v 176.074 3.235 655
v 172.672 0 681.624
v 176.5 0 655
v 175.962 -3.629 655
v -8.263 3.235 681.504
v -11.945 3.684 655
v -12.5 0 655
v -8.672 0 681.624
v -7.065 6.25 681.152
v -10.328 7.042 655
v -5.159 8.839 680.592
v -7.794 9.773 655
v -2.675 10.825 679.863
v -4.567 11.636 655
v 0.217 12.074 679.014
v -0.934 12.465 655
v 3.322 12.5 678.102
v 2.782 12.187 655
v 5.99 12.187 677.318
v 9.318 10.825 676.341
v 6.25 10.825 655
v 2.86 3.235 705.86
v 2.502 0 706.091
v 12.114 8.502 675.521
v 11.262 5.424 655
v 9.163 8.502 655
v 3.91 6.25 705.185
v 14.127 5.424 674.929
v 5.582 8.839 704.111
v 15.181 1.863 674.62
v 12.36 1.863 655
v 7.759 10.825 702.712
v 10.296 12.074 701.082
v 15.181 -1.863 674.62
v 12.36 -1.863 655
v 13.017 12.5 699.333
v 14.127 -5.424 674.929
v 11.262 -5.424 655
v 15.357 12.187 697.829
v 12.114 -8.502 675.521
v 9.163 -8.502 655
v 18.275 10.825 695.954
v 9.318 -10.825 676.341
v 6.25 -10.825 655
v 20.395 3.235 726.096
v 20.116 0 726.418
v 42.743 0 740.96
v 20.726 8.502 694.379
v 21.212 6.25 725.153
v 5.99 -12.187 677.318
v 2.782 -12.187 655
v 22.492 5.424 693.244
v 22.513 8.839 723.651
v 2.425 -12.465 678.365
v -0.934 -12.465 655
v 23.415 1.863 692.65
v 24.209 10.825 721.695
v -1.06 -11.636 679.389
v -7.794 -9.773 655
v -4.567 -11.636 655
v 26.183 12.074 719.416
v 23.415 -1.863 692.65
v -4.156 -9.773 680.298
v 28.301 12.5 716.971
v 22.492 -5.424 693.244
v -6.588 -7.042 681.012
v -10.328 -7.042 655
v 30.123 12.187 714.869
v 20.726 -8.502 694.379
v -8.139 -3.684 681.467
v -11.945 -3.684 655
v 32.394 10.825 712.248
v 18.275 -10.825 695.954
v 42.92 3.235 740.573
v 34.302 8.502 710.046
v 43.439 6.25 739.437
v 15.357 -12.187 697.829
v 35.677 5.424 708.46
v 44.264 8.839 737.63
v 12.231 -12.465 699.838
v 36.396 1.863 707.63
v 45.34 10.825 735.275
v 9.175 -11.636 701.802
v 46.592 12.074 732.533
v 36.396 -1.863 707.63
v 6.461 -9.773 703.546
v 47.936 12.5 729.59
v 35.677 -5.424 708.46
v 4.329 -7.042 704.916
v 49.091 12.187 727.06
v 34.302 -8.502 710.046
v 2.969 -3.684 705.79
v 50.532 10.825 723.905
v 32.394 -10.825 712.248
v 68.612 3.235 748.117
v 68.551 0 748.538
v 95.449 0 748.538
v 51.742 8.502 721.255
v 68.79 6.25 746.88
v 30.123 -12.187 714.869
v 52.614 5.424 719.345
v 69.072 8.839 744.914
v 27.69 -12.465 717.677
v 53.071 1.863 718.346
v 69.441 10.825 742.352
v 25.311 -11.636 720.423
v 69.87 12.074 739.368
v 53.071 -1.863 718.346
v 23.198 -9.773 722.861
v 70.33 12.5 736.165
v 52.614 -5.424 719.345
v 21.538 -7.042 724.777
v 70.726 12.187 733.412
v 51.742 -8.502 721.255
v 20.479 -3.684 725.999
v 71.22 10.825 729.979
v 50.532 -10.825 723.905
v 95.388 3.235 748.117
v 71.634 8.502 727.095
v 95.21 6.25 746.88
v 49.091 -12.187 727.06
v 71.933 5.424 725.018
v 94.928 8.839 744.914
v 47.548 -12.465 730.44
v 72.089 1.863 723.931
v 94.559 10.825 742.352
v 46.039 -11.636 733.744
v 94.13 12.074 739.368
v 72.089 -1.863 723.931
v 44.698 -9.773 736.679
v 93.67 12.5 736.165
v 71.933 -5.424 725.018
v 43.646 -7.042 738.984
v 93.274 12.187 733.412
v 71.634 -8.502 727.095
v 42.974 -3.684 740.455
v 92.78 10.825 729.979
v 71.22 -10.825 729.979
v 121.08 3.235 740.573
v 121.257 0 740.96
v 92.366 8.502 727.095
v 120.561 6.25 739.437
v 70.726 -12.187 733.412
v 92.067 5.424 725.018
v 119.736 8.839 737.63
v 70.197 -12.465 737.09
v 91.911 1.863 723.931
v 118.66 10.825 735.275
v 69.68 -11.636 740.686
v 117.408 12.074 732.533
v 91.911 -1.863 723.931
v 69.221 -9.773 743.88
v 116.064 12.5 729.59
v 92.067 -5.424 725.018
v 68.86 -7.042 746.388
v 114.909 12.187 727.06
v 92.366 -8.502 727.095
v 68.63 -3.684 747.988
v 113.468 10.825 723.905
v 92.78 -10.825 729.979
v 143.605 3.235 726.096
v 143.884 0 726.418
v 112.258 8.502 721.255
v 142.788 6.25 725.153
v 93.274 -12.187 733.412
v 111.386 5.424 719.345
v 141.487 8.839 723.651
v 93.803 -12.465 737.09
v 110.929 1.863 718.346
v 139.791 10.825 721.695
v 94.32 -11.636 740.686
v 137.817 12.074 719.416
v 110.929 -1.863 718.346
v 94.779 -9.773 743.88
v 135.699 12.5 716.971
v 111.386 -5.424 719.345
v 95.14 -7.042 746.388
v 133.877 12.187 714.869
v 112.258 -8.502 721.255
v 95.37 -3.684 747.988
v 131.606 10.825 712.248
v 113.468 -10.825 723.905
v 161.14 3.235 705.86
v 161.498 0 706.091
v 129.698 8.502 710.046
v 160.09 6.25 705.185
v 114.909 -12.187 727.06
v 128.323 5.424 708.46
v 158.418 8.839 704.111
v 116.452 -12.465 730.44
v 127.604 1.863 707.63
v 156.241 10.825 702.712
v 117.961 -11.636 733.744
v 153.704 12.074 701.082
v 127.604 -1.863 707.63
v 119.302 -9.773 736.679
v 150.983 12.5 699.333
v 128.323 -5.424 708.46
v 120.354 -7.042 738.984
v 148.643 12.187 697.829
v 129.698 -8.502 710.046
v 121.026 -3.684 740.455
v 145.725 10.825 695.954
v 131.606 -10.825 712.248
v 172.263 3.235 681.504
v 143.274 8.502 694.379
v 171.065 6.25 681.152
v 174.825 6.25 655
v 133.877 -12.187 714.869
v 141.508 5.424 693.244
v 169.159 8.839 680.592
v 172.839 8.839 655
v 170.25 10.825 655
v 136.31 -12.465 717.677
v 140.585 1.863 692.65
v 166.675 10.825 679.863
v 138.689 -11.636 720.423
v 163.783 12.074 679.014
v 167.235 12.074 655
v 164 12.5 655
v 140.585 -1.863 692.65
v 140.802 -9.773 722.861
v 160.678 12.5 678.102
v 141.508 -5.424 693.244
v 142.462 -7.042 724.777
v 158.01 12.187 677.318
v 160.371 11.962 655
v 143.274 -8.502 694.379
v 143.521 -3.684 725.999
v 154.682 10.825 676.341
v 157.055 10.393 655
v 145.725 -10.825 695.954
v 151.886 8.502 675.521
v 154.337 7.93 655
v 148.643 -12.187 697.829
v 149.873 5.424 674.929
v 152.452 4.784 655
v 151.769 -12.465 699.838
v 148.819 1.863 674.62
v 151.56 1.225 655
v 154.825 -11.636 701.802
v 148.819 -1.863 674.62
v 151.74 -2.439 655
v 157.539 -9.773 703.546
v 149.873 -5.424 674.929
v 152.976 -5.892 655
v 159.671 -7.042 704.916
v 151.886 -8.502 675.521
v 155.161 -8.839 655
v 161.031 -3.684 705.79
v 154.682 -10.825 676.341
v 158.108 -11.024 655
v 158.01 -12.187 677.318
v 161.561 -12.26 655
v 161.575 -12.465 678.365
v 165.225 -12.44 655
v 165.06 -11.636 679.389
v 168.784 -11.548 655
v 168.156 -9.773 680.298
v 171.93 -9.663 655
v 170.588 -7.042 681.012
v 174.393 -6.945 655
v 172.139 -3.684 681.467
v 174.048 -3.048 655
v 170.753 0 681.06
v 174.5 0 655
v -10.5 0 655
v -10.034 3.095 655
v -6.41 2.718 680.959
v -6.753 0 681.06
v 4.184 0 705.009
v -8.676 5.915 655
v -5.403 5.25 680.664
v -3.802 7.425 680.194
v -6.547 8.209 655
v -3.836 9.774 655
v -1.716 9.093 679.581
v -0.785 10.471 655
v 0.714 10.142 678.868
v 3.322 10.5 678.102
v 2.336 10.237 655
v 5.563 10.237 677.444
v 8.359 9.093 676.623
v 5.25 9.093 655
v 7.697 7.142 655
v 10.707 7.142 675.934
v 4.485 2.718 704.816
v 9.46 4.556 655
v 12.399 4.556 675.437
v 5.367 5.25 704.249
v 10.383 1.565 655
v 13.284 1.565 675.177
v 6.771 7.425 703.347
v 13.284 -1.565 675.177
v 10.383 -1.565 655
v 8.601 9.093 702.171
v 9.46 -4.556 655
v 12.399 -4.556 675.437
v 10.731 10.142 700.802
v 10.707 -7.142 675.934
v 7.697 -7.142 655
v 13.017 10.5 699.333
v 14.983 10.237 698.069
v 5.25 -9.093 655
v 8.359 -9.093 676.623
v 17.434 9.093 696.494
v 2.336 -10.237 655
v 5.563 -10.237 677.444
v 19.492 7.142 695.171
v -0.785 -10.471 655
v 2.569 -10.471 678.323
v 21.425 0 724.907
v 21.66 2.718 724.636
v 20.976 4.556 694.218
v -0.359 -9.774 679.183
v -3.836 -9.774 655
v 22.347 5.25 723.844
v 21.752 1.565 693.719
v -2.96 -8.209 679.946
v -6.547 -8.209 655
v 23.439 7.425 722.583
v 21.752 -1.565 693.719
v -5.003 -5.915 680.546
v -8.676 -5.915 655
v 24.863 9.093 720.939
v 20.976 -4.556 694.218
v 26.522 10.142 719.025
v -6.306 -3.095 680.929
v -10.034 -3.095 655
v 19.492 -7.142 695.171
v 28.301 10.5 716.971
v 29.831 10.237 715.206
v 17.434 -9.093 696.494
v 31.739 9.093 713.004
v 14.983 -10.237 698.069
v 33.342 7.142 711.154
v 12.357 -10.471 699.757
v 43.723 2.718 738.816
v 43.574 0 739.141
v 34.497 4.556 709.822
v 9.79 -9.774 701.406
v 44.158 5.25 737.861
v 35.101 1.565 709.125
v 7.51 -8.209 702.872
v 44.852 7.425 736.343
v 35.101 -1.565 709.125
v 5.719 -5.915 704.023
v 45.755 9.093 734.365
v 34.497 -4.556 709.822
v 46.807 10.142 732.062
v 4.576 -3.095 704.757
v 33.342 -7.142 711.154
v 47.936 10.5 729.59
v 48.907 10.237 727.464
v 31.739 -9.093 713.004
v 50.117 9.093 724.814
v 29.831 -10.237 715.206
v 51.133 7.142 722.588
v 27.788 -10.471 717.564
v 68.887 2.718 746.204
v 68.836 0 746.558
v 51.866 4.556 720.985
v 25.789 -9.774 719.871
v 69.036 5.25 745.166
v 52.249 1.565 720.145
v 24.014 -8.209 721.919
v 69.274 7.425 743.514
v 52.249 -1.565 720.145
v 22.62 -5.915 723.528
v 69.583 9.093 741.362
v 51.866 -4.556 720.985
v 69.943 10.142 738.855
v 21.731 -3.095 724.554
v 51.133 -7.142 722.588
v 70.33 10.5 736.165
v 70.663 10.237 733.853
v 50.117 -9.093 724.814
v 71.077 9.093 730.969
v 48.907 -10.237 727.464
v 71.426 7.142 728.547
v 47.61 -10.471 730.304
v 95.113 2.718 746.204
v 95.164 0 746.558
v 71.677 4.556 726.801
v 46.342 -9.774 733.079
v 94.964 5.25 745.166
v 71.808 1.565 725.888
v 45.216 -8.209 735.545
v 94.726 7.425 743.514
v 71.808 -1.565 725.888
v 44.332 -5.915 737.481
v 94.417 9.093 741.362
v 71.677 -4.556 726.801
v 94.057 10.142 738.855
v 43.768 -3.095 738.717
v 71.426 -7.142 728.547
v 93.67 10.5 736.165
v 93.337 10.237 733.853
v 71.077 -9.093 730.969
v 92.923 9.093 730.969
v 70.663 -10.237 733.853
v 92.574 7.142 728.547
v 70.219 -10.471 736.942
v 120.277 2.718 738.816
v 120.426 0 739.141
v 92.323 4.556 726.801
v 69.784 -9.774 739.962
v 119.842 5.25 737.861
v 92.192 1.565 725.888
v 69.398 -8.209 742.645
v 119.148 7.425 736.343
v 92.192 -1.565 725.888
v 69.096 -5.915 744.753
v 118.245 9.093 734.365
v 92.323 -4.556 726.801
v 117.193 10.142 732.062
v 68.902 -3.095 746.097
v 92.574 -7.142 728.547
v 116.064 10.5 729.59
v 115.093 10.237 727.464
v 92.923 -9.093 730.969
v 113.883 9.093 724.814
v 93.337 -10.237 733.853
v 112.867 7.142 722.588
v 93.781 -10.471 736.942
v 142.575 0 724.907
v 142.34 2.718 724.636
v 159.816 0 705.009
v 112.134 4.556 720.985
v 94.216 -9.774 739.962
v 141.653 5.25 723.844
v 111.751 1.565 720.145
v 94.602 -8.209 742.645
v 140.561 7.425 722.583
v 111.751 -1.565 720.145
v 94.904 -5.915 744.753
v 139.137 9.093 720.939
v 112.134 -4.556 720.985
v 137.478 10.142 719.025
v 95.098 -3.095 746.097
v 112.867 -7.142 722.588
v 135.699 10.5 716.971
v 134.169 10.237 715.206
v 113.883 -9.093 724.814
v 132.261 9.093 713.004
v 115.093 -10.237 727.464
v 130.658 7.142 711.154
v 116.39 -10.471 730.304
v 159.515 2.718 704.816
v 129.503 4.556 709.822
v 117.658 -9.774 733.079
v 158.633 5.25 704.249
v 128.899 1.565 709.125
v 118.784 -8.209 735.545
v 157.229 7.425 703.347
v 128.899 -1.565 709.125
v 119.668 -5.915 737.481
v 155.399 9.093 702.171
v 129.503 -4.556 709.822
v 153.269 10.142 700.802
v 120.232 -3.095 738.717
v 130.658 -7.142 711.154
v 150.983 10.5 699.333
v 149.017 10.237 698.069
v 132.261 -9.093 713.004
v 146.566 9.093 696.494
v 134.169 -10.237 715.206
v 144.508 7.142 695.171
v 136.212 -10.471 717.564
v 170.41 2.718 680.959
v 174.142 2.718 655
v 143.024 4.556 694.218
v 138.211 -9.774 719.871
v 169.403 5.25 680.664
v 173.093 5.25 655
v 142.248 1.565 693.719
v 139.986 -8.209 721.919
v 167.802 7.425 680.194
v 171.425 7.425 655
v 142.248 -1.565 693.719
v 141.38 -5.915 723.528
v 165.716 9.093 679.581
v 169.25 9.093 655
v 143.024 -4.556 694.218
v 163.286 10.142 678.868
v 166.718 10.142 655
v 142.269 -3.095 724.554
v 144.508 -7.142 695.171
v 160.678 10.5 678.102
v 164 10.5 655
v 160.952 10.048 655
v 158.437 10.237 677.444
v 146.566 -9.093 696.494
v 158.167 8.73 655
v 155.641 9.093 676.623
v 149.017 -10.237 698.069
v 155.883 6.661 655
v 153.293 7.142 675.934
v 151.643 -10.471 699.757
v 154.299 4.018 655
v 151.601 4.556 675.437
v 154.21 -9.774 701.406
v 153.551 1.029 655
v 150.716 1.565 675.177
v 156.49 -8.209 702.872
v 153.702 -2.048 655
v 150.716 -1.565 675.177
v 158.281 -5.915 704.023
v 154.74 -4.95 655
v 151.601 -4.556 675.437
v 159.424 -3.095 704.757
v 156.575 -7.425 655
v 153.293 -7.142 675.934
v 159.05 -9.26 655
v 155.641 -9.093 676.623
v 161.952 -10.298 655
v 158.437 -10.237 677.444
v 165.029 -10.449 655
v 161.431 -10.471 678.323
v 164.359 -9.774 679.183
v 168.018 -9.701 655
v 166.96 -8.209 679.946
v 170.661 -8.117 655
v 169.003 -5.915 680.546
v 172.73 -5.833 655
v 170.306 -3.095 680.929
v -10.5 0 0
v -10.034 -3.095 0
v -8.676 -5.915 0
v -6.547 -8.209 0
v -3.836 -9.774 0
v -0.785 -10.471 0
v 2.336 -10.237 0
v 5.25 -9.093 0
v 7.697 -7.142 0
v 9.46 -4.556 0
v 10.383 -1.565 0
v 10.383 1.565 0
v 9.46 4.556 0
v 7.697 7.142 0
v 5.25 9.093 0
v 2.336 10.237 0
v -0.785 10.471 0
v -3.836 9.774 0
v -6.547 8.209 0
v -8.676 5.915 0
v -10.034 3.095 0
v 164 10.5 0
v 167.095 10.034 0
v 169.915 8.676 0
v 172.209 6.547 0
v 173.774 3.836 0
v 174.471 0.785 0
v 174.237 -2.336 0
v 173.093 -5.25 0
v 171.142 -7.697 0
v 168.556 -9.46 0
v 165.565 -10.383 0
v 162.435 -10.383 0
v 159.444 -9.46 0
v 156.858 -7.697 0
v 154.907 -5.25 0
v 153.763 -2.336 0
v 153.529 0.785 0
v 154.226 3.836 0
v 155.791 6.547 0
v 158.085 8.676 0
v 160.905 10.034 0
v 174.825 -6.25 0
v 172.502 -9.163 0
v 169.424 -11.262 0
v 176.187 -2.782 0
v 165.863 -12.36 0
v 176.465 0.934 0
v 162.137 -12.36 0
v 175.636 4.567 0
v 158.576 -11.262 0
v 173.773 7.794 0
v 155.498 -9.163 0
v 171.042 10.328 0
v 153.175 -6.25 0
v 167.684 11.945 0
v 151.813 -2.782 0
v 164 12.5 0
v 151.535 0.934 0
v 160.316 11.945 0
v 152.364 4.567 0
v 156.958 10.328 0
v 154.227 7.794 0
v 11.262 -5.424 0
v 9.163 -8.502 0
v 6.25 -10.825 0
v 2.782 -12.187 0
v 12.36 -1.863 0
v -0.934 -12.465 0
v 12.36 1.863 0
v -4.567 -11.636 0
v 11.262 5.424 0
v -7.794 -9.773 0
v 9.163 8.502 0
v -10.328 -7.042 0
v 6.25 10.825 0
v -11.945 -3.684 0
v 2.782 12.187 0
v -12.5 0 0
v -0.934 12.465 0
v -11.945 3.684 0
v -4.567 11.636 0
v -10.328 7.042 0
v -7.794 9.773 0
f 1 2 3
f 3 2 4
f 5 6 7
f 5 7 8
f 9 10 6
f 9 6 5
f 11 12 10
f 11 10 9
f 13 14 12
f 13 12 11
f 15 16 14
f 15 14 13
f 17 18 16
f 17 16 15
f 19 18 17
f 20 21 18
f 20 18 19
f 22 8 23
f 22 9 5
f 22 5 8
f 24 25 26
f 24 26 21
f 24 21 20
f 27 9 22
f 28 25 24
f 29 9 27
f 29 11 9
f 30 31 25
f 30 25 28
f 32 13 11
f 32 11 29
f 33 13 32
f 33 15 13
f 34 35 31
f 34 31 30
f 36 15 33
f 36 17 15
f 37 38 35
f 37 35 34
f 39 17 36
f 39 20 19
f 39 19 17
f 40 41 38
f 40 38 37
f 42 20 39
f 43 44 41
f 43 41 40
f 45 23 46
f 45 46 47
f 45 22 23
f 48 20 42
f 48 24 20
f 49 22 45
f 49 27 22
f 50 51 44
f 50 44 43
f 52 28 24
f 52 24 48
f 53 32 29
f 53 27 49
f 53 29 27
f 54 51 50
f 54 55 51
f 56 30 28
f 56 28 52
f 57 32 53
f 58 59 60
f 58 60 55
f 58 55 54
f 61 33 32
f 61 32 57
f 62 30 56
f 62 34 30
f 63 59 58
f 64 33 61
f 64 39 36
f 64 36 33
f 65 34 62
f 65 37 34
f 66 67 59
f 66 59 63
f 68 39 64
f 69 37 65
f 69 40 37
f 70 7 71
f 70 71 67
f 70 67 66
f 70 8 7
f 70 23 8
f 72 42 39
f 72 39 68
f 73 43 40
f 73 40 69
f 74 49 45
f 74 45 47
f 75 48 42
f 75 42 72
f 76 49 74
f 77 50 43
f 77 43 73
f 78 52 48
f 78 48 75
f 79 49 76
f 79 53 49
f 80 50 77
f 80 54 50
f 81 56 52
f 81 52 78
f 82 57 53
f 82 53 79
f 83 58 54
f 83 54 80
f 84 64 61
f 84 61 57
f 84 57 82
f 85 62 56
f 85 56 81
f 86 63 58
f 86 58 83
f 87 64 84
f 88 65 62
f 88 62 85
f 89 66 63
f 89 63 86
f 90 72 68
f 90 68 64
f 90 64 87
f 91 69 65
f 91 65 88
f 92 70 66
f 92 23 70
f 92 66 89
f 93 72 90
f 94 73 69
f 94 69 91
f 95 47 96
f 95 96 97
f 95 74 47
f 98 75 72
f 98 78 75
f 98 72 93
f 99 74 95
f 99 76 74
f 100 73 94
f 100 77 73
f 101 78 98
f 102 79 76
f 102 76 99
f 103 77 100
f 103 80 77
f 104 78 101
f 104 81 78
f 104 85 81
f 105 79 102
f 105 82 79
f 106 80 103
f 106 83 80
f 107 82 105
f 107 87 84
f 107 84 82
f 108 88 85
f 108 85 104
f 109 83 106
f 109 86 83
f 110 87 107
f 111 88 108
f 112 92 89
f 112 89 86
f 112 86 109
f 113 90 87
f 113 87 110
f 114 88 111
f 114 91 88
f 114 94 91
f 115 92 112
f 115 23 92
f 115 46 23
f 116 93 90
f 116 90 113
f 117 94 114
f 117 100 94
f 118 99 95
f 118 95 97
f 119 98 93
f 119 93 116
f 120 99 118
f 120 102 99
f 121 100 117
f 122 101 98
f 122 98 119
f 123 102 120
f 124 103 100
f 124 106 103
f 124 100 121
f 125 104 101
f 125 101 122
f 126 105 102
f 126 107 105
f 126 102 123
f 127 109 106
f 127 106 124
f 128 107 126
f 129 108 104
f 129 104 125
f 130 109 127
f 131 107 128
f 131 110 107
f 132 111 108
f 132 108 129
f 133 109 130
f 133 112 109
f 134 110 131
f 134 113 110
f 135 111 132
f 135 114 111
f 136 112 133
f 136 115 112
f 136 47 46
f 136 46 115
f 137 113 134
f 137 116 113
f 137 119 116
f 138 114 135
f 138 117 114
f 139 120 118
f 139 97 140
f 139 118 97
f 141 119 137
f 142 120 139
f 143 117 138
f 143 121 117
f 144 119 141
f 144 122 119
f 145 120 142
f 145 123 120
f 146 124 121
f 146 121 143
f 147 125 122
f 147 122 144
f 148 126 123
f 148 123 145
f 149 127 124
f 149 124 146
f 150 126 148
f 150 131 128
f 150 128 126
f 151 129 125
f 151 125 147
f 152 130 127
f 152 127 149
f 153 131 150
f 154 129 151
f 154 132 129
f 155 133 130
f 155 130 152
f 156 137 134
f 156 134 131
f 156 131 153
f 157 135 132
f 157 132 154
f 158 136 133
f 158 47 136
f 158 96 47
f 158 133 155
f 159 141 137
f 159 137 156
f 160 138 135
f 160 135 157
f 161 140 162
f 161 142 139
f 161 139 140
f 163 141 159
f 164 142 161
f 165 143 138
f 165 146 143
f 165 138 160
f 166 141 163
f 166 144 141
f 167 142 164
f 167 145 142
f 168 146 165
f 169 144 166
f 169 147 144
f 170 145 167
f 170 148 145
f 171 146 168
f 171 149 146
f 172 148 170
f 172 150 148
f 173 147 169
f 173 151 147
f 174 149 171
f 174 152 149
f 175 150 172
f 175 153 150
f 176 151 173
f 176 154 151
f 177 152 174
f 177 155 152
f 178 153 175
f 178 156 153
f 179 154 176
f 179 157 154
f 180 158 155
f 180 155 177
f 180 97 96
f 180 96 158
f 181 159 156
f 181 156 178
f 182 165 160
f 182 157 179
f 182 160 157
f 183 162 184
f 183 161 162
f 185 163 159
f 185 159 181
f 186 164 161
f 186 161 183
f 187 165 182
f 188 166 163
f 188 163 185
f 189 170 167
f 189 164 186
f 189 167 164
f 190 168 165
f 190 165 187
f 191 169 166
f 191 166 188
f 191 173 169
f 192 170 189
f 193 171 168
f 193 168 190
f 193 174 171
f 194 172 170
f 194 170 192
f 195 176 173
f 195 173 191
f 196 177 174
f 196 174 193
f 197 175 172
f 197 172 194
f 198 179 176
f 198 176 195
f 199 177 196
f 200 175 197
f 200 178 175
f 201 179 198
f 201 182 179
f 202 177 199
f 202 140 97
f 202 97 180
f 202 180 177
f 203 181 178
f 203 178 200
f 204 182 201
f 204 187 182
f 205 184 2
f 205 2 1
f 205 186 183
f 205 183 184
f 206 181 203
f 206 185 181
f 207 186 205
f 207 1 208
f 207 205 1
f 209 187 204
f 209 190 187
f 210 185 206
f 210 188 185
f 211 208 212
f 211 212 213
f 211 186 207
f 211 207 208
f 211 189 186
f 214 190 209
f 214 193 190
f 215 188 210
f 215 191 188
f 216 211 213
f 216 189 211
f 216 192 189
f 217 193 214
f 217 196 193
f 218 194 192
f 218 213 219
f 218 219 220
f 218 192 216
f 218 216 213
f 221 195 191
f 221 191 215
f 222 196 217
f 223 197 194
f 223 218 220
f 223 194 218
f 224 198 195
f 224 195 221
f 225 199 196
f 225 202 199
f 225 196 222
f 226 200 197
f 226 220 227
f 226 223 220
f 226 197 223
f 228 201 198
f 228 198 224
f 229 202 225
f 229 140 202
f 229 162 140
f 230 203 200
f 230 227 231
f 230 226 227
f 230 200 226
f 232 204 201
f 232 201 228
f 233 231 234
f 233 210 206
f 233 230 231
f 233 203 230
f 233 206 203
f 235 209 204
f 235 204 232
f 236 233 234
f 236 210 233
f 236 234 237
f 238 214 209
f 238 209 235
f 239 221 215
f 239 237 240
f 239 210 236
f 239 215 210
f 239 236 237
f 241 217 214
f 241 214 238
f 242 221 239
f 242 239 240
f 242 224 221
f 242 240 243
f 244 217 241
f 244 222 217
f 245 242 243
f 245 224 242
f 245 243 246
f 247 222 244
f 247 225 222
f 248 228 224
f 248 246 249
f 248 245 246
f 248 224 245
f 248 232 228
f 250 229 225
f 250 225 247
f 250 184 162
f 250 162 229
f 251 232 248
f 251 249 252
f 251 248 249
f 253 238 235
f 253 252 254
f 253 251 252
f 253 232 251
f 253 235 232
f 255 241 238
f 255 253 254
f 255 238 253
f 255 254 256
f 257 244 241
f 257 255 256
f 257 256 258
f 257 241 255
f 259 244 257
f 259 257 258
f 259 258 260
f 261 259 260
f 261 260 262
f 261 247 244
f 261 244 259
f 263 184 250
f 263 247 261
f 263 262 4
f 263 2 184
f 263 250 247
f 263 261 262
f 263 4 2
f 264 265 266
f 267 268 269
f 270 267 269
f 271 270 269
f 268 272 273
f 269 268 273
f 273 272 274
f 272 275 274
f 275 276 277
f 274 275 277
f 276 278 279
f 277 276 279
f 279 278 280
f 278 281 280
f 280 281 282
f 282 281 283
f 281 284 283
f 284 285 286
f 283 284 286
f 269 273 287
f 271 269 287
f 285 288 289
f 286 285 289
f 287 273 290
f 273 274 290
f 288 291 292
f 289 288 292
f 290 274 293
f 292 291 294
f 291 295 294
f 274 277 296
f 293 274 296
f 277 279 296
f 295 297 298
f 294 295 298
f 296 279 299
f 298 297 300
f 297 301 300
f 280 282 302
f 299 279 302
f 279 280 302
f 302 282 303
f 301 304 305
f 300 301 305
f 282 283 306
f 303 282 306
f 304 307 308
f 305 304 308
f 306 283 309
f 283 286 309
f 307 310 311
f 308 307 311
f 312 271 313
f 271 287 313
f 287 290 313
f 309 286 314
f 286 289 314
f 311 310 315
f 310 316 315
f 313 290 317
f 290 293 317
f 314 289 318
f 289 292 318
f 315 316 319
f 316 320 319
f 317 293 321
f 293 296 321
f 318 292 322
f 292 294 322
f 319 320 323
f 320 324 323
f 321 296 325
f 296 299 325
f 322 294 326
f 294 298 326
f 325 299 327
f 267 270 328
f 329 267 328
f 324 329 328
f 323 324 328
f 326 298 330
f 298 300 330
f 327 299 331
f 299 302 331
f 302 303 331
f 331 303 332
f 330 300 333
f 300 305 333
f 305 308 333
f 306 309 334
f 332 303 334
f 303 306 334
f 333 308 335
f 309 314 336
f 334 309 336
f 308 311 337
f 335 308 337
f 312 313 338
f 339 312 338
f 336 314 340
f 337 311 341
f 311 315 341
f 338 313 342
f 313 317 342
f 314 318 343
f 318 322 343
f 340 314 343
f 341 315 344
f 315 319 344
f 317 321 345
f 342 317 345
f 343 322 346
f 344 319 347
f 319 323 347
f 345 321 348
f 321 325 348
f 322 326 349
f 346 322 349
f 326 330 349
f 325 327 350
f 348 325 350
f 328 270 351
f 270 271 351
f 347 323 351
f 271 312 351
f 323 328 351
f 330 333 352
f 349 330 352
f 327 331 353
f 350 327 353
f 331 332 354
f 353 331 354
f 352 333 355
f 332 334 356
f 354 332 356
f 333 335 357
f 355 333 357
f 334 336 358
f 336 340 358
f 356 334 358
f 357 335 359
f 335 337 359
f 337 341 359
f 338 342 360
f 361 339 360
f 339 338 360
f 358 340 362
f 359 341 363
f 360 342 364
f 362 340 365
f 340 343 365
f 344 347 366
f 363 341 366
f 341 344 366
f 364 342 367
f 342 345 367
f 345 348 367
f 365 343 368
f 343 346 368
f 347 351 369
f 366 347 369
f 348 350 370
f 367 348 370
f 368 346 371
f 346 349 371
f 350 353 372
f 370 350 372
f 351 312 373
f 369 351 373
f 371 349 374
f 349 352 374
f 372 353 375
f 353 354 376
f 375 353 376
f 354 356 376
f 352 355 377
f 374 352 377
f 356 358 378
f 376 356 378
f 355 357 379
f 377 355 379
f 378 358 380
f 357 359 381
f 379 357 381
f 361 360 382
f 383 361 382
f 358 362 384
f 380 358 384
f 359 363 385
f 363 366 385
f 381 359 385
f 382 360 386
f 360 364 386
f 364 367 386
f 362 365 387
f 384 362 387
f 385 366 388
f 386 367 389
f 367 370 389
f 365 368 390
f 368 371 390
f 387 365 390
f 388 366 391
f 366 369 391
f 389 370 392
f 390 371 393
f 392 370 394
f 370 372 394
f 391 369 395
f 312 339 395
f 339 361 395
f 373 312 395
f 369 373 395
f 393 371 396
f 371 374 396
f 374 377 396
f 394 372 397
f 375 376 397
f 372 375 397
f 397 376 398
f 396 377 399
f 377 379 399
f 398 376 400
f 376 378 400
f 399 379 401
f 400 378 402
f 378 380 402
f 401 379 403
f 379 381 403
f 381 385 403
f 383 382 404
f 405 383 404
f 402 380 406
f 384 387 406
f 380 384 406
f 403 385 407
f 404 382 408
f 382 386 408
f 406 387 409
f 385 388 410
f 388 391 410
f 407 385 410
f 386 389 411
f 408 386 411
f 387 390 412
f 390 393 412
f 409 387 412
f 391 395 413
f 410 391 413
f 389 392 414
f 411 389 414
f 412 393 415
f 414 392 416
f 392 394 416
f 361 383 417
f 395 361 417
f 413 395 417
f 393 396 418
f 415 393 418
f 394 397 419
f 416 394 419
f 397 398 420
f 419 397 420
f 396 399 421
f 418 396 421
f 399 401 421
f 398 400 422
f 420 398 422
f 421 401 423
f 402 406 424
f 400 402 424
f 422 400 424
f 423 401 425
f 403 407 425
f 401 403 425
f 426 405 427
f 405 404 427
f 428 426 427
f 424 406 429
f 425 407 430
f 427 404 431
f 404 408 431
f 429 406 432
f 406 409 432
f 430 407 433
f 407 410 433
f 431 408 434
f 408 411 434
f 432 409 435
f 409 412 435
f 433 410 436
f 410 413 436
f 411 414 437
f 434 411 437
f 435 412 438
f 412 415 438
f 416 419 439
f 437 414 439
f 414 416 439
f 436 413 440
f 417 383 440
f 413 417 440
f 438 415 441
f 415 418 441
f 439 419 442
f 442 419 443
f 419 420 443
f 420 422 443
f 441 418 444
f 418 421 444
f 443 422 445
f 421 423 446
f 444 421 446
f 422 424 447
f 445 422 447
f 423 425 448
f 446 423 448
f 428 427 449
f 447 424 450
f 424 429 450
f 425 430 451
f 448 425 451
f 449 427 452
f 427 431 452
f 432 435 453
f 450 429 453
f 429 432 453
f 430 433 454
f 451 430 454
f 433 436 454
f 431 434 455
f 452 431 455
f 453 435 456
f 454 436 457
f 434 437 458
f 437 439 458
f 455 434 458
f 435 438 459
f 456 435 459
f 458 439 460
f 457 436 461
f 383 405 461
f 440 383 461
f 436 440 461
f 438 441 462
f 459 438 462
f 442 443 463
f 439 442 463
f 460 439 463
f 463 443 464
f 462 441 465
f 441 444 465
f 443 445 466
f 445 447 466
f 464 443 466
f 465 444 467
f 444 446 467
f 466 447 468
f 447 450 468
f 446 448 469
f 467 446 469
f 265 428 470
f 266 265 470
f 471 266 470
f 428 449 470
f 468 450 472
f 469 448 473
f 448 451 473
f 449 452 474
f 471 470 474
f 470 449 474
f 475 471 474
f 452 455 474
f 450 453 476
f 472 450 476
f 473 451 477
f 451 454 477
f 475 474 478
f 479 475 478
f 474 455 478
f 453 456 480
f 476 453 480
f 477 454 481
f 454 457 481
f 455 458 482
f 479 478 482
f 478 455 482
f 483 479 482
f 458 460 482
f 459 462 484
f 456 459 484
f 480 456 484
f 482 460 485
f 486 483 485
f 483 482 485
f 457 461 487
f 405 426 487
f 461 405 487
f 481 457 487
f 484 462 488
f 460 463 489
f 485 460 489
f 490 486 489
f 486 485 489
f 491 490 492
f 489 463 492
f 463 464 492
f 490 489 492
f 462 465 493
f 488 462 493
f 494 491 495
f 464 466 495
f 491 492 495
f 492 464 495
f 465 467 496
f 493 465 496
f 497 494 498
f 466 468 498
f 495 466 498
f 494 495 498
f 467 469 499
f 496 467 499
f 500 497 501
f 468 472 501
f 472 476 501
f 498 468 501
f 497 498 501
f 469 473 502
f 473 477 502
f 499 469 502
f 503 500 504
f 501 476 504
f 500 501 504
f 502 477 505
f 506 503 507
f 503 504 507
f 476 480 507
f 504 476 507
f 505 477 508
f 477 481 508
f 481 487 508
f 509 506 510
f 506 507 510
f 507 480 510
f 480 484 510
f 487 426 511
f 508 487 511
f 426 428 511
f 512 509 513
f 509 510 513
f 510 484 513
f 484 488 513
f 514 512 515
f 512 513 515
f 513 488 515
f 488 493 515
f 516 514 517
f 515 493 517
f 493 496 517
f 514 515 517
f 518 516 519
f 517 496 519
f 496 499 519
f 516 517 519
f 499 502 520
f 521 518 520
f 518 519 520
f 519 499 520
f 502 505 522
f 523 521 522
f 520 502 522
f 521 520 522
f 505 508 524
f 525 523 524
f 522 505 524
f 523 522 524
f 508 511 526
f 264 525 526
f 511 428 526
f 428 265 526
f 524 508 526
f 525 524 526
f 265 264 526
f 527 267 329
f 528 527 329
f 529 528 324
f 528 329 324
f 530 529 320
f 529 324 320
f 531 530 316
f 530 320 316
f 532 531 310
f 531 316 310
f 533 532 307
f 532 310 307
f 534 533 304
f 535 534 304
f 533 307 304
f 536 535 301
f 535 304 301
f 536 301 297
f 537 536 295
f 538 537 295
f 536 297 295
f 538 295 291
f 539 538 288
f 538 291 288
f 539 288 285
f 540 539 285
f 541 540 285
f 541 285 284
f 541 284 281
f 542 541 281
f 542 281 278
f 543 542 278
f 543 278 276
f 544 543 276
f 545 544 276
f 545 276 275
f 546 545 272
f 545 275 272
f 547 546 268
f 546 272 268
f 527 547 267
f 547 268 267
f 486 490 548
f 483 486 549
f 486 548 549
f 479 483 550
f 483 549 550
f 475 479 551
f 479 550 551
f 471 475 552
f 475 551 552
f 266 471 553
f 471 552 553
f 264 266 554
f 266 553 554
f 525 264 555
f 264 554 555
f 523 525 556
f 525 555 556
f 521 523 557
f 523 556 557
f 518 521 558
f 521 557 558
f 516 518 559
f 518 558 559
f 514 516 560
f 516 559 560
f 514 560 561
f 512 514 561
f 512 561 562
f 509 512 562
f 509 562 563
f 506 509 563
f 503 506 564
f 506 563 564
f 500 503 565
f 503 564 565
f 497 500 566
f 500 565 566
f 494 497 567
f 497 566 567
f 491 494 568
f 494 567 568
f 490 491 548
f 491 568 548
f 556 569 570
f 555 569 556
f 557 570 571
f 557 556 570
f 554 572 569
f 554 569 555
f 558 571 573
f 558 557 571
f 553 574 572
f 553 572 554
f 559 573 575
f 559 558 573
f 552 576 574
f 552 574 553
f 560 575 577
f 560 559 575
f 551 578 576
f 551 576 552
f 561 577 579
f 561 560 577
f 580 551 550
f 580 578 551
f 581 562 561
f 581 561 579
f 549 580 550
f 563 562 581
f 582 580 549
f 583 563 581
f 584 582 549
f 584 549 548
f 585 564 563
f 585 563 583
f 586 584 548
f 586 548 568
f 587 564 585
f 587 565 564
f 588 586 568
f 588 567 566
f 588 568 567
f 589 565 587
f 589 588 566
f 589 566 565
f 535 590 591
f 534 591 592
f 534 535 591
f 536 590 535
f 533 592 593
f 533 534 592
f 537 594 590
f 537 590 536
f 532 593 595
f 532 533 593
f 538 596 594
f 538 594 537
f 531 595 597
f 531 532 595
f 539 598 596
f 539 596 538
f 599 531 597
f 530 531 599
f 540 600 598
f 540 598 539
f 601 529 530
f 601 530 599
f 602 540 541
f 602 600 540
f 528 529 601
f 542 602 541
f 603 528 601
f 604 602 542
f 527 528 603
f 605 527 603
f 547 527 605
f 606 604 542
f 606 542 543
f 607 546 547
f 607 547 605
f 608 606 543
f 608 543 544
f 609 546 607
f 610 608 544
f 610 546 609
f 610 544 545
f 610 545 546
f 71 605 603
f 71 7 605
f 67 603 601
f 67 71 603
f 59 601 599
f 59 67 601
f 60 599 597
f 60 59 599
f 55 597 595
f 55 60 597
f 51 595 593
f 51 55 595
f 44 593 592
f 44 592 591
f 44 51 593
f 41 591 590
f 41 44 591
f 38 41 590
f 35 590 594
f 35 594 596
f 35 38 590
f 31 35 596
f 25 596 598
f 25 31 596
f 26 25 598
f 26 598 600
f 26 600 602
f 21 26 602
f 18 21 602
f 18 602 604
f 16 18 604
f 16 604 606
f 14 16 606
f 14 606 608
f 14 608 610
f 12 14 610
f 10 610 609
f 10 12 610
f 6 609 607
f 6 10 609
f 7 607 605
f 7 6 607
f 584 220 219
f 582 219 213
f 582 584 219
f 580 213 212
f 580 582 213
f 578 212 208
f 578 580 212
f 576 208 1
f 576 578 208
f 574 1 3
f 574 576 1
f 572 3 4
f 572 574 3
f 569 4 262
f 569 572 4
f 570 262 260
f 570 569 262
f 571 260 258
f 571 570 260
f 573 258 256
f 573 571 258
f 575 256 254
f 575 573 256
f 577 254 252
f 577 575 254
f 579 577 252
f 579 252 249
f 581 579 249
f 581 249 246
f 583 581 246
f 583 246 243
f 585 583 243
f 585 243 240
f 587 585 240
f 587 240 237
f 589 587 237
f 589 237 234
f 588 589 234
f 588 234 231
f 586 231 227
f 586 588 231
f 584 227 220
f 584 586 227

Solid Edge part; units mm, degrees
sketch "Sketch1" plane through (0, 0, 0) normal (0, -1, 0) x (1, 0, 0)
  line L0 (0, 0) -> (0, 655)
  dimension "D1" = 164
  dimension "D2" = 655
sketch "Sketch2" plane through (0, 0, 0) normal (0, 0, -1) x (-1, 0, 0)
  circle A0 centre (0, 0) radius 12.5
  dimension "D1" = 25
sweep "SweptProtrusion_8" add profiles "Sketch2" path "Sketch1"
sketch "Sketch3" plane through (0, 0, 0) normal (0, -1, 0) x (1, 0, 0)
  arc A0 (0, 655) -> (164, 655) centre (82, 655) cw
sketch "Sketch4" plane through (0, 0, 655) normal (0, 0, 1) x (-1, 0, 0)
  circle A0 centre (0, 0) radius 12.5
  dimension "D1" = 25
sweep "SweptProtrusion_10" add profiles "Sketch4" path "Sketch3"
sketch "Sketch5" plane through (0, 0, 0) normal (0, -1, 0) x (1, 0, 0)
  line L0 (164, 655) -> (164, 0)
  dimension "D1" = 164
  dimension "D2" = 655
sketch "Sketch6" plane through (100, 0, 655) normal (0, 0, -1) x (0, 1, 0)
  circle A0 centre (0, 64) radius 12.5
sweep "SweptProtrusion_11" add profiles "Sketch6" path "Sketch5"
shell "Thinwall_2" thickness 2 removed faces 4 at (8.5833, -8.0833, 0) at (172.5833, -8.0833, 0) at (8.5833, -8.0833, 0) at (172.5833, -8.0833, 0)
properties material "Stainless steel"
